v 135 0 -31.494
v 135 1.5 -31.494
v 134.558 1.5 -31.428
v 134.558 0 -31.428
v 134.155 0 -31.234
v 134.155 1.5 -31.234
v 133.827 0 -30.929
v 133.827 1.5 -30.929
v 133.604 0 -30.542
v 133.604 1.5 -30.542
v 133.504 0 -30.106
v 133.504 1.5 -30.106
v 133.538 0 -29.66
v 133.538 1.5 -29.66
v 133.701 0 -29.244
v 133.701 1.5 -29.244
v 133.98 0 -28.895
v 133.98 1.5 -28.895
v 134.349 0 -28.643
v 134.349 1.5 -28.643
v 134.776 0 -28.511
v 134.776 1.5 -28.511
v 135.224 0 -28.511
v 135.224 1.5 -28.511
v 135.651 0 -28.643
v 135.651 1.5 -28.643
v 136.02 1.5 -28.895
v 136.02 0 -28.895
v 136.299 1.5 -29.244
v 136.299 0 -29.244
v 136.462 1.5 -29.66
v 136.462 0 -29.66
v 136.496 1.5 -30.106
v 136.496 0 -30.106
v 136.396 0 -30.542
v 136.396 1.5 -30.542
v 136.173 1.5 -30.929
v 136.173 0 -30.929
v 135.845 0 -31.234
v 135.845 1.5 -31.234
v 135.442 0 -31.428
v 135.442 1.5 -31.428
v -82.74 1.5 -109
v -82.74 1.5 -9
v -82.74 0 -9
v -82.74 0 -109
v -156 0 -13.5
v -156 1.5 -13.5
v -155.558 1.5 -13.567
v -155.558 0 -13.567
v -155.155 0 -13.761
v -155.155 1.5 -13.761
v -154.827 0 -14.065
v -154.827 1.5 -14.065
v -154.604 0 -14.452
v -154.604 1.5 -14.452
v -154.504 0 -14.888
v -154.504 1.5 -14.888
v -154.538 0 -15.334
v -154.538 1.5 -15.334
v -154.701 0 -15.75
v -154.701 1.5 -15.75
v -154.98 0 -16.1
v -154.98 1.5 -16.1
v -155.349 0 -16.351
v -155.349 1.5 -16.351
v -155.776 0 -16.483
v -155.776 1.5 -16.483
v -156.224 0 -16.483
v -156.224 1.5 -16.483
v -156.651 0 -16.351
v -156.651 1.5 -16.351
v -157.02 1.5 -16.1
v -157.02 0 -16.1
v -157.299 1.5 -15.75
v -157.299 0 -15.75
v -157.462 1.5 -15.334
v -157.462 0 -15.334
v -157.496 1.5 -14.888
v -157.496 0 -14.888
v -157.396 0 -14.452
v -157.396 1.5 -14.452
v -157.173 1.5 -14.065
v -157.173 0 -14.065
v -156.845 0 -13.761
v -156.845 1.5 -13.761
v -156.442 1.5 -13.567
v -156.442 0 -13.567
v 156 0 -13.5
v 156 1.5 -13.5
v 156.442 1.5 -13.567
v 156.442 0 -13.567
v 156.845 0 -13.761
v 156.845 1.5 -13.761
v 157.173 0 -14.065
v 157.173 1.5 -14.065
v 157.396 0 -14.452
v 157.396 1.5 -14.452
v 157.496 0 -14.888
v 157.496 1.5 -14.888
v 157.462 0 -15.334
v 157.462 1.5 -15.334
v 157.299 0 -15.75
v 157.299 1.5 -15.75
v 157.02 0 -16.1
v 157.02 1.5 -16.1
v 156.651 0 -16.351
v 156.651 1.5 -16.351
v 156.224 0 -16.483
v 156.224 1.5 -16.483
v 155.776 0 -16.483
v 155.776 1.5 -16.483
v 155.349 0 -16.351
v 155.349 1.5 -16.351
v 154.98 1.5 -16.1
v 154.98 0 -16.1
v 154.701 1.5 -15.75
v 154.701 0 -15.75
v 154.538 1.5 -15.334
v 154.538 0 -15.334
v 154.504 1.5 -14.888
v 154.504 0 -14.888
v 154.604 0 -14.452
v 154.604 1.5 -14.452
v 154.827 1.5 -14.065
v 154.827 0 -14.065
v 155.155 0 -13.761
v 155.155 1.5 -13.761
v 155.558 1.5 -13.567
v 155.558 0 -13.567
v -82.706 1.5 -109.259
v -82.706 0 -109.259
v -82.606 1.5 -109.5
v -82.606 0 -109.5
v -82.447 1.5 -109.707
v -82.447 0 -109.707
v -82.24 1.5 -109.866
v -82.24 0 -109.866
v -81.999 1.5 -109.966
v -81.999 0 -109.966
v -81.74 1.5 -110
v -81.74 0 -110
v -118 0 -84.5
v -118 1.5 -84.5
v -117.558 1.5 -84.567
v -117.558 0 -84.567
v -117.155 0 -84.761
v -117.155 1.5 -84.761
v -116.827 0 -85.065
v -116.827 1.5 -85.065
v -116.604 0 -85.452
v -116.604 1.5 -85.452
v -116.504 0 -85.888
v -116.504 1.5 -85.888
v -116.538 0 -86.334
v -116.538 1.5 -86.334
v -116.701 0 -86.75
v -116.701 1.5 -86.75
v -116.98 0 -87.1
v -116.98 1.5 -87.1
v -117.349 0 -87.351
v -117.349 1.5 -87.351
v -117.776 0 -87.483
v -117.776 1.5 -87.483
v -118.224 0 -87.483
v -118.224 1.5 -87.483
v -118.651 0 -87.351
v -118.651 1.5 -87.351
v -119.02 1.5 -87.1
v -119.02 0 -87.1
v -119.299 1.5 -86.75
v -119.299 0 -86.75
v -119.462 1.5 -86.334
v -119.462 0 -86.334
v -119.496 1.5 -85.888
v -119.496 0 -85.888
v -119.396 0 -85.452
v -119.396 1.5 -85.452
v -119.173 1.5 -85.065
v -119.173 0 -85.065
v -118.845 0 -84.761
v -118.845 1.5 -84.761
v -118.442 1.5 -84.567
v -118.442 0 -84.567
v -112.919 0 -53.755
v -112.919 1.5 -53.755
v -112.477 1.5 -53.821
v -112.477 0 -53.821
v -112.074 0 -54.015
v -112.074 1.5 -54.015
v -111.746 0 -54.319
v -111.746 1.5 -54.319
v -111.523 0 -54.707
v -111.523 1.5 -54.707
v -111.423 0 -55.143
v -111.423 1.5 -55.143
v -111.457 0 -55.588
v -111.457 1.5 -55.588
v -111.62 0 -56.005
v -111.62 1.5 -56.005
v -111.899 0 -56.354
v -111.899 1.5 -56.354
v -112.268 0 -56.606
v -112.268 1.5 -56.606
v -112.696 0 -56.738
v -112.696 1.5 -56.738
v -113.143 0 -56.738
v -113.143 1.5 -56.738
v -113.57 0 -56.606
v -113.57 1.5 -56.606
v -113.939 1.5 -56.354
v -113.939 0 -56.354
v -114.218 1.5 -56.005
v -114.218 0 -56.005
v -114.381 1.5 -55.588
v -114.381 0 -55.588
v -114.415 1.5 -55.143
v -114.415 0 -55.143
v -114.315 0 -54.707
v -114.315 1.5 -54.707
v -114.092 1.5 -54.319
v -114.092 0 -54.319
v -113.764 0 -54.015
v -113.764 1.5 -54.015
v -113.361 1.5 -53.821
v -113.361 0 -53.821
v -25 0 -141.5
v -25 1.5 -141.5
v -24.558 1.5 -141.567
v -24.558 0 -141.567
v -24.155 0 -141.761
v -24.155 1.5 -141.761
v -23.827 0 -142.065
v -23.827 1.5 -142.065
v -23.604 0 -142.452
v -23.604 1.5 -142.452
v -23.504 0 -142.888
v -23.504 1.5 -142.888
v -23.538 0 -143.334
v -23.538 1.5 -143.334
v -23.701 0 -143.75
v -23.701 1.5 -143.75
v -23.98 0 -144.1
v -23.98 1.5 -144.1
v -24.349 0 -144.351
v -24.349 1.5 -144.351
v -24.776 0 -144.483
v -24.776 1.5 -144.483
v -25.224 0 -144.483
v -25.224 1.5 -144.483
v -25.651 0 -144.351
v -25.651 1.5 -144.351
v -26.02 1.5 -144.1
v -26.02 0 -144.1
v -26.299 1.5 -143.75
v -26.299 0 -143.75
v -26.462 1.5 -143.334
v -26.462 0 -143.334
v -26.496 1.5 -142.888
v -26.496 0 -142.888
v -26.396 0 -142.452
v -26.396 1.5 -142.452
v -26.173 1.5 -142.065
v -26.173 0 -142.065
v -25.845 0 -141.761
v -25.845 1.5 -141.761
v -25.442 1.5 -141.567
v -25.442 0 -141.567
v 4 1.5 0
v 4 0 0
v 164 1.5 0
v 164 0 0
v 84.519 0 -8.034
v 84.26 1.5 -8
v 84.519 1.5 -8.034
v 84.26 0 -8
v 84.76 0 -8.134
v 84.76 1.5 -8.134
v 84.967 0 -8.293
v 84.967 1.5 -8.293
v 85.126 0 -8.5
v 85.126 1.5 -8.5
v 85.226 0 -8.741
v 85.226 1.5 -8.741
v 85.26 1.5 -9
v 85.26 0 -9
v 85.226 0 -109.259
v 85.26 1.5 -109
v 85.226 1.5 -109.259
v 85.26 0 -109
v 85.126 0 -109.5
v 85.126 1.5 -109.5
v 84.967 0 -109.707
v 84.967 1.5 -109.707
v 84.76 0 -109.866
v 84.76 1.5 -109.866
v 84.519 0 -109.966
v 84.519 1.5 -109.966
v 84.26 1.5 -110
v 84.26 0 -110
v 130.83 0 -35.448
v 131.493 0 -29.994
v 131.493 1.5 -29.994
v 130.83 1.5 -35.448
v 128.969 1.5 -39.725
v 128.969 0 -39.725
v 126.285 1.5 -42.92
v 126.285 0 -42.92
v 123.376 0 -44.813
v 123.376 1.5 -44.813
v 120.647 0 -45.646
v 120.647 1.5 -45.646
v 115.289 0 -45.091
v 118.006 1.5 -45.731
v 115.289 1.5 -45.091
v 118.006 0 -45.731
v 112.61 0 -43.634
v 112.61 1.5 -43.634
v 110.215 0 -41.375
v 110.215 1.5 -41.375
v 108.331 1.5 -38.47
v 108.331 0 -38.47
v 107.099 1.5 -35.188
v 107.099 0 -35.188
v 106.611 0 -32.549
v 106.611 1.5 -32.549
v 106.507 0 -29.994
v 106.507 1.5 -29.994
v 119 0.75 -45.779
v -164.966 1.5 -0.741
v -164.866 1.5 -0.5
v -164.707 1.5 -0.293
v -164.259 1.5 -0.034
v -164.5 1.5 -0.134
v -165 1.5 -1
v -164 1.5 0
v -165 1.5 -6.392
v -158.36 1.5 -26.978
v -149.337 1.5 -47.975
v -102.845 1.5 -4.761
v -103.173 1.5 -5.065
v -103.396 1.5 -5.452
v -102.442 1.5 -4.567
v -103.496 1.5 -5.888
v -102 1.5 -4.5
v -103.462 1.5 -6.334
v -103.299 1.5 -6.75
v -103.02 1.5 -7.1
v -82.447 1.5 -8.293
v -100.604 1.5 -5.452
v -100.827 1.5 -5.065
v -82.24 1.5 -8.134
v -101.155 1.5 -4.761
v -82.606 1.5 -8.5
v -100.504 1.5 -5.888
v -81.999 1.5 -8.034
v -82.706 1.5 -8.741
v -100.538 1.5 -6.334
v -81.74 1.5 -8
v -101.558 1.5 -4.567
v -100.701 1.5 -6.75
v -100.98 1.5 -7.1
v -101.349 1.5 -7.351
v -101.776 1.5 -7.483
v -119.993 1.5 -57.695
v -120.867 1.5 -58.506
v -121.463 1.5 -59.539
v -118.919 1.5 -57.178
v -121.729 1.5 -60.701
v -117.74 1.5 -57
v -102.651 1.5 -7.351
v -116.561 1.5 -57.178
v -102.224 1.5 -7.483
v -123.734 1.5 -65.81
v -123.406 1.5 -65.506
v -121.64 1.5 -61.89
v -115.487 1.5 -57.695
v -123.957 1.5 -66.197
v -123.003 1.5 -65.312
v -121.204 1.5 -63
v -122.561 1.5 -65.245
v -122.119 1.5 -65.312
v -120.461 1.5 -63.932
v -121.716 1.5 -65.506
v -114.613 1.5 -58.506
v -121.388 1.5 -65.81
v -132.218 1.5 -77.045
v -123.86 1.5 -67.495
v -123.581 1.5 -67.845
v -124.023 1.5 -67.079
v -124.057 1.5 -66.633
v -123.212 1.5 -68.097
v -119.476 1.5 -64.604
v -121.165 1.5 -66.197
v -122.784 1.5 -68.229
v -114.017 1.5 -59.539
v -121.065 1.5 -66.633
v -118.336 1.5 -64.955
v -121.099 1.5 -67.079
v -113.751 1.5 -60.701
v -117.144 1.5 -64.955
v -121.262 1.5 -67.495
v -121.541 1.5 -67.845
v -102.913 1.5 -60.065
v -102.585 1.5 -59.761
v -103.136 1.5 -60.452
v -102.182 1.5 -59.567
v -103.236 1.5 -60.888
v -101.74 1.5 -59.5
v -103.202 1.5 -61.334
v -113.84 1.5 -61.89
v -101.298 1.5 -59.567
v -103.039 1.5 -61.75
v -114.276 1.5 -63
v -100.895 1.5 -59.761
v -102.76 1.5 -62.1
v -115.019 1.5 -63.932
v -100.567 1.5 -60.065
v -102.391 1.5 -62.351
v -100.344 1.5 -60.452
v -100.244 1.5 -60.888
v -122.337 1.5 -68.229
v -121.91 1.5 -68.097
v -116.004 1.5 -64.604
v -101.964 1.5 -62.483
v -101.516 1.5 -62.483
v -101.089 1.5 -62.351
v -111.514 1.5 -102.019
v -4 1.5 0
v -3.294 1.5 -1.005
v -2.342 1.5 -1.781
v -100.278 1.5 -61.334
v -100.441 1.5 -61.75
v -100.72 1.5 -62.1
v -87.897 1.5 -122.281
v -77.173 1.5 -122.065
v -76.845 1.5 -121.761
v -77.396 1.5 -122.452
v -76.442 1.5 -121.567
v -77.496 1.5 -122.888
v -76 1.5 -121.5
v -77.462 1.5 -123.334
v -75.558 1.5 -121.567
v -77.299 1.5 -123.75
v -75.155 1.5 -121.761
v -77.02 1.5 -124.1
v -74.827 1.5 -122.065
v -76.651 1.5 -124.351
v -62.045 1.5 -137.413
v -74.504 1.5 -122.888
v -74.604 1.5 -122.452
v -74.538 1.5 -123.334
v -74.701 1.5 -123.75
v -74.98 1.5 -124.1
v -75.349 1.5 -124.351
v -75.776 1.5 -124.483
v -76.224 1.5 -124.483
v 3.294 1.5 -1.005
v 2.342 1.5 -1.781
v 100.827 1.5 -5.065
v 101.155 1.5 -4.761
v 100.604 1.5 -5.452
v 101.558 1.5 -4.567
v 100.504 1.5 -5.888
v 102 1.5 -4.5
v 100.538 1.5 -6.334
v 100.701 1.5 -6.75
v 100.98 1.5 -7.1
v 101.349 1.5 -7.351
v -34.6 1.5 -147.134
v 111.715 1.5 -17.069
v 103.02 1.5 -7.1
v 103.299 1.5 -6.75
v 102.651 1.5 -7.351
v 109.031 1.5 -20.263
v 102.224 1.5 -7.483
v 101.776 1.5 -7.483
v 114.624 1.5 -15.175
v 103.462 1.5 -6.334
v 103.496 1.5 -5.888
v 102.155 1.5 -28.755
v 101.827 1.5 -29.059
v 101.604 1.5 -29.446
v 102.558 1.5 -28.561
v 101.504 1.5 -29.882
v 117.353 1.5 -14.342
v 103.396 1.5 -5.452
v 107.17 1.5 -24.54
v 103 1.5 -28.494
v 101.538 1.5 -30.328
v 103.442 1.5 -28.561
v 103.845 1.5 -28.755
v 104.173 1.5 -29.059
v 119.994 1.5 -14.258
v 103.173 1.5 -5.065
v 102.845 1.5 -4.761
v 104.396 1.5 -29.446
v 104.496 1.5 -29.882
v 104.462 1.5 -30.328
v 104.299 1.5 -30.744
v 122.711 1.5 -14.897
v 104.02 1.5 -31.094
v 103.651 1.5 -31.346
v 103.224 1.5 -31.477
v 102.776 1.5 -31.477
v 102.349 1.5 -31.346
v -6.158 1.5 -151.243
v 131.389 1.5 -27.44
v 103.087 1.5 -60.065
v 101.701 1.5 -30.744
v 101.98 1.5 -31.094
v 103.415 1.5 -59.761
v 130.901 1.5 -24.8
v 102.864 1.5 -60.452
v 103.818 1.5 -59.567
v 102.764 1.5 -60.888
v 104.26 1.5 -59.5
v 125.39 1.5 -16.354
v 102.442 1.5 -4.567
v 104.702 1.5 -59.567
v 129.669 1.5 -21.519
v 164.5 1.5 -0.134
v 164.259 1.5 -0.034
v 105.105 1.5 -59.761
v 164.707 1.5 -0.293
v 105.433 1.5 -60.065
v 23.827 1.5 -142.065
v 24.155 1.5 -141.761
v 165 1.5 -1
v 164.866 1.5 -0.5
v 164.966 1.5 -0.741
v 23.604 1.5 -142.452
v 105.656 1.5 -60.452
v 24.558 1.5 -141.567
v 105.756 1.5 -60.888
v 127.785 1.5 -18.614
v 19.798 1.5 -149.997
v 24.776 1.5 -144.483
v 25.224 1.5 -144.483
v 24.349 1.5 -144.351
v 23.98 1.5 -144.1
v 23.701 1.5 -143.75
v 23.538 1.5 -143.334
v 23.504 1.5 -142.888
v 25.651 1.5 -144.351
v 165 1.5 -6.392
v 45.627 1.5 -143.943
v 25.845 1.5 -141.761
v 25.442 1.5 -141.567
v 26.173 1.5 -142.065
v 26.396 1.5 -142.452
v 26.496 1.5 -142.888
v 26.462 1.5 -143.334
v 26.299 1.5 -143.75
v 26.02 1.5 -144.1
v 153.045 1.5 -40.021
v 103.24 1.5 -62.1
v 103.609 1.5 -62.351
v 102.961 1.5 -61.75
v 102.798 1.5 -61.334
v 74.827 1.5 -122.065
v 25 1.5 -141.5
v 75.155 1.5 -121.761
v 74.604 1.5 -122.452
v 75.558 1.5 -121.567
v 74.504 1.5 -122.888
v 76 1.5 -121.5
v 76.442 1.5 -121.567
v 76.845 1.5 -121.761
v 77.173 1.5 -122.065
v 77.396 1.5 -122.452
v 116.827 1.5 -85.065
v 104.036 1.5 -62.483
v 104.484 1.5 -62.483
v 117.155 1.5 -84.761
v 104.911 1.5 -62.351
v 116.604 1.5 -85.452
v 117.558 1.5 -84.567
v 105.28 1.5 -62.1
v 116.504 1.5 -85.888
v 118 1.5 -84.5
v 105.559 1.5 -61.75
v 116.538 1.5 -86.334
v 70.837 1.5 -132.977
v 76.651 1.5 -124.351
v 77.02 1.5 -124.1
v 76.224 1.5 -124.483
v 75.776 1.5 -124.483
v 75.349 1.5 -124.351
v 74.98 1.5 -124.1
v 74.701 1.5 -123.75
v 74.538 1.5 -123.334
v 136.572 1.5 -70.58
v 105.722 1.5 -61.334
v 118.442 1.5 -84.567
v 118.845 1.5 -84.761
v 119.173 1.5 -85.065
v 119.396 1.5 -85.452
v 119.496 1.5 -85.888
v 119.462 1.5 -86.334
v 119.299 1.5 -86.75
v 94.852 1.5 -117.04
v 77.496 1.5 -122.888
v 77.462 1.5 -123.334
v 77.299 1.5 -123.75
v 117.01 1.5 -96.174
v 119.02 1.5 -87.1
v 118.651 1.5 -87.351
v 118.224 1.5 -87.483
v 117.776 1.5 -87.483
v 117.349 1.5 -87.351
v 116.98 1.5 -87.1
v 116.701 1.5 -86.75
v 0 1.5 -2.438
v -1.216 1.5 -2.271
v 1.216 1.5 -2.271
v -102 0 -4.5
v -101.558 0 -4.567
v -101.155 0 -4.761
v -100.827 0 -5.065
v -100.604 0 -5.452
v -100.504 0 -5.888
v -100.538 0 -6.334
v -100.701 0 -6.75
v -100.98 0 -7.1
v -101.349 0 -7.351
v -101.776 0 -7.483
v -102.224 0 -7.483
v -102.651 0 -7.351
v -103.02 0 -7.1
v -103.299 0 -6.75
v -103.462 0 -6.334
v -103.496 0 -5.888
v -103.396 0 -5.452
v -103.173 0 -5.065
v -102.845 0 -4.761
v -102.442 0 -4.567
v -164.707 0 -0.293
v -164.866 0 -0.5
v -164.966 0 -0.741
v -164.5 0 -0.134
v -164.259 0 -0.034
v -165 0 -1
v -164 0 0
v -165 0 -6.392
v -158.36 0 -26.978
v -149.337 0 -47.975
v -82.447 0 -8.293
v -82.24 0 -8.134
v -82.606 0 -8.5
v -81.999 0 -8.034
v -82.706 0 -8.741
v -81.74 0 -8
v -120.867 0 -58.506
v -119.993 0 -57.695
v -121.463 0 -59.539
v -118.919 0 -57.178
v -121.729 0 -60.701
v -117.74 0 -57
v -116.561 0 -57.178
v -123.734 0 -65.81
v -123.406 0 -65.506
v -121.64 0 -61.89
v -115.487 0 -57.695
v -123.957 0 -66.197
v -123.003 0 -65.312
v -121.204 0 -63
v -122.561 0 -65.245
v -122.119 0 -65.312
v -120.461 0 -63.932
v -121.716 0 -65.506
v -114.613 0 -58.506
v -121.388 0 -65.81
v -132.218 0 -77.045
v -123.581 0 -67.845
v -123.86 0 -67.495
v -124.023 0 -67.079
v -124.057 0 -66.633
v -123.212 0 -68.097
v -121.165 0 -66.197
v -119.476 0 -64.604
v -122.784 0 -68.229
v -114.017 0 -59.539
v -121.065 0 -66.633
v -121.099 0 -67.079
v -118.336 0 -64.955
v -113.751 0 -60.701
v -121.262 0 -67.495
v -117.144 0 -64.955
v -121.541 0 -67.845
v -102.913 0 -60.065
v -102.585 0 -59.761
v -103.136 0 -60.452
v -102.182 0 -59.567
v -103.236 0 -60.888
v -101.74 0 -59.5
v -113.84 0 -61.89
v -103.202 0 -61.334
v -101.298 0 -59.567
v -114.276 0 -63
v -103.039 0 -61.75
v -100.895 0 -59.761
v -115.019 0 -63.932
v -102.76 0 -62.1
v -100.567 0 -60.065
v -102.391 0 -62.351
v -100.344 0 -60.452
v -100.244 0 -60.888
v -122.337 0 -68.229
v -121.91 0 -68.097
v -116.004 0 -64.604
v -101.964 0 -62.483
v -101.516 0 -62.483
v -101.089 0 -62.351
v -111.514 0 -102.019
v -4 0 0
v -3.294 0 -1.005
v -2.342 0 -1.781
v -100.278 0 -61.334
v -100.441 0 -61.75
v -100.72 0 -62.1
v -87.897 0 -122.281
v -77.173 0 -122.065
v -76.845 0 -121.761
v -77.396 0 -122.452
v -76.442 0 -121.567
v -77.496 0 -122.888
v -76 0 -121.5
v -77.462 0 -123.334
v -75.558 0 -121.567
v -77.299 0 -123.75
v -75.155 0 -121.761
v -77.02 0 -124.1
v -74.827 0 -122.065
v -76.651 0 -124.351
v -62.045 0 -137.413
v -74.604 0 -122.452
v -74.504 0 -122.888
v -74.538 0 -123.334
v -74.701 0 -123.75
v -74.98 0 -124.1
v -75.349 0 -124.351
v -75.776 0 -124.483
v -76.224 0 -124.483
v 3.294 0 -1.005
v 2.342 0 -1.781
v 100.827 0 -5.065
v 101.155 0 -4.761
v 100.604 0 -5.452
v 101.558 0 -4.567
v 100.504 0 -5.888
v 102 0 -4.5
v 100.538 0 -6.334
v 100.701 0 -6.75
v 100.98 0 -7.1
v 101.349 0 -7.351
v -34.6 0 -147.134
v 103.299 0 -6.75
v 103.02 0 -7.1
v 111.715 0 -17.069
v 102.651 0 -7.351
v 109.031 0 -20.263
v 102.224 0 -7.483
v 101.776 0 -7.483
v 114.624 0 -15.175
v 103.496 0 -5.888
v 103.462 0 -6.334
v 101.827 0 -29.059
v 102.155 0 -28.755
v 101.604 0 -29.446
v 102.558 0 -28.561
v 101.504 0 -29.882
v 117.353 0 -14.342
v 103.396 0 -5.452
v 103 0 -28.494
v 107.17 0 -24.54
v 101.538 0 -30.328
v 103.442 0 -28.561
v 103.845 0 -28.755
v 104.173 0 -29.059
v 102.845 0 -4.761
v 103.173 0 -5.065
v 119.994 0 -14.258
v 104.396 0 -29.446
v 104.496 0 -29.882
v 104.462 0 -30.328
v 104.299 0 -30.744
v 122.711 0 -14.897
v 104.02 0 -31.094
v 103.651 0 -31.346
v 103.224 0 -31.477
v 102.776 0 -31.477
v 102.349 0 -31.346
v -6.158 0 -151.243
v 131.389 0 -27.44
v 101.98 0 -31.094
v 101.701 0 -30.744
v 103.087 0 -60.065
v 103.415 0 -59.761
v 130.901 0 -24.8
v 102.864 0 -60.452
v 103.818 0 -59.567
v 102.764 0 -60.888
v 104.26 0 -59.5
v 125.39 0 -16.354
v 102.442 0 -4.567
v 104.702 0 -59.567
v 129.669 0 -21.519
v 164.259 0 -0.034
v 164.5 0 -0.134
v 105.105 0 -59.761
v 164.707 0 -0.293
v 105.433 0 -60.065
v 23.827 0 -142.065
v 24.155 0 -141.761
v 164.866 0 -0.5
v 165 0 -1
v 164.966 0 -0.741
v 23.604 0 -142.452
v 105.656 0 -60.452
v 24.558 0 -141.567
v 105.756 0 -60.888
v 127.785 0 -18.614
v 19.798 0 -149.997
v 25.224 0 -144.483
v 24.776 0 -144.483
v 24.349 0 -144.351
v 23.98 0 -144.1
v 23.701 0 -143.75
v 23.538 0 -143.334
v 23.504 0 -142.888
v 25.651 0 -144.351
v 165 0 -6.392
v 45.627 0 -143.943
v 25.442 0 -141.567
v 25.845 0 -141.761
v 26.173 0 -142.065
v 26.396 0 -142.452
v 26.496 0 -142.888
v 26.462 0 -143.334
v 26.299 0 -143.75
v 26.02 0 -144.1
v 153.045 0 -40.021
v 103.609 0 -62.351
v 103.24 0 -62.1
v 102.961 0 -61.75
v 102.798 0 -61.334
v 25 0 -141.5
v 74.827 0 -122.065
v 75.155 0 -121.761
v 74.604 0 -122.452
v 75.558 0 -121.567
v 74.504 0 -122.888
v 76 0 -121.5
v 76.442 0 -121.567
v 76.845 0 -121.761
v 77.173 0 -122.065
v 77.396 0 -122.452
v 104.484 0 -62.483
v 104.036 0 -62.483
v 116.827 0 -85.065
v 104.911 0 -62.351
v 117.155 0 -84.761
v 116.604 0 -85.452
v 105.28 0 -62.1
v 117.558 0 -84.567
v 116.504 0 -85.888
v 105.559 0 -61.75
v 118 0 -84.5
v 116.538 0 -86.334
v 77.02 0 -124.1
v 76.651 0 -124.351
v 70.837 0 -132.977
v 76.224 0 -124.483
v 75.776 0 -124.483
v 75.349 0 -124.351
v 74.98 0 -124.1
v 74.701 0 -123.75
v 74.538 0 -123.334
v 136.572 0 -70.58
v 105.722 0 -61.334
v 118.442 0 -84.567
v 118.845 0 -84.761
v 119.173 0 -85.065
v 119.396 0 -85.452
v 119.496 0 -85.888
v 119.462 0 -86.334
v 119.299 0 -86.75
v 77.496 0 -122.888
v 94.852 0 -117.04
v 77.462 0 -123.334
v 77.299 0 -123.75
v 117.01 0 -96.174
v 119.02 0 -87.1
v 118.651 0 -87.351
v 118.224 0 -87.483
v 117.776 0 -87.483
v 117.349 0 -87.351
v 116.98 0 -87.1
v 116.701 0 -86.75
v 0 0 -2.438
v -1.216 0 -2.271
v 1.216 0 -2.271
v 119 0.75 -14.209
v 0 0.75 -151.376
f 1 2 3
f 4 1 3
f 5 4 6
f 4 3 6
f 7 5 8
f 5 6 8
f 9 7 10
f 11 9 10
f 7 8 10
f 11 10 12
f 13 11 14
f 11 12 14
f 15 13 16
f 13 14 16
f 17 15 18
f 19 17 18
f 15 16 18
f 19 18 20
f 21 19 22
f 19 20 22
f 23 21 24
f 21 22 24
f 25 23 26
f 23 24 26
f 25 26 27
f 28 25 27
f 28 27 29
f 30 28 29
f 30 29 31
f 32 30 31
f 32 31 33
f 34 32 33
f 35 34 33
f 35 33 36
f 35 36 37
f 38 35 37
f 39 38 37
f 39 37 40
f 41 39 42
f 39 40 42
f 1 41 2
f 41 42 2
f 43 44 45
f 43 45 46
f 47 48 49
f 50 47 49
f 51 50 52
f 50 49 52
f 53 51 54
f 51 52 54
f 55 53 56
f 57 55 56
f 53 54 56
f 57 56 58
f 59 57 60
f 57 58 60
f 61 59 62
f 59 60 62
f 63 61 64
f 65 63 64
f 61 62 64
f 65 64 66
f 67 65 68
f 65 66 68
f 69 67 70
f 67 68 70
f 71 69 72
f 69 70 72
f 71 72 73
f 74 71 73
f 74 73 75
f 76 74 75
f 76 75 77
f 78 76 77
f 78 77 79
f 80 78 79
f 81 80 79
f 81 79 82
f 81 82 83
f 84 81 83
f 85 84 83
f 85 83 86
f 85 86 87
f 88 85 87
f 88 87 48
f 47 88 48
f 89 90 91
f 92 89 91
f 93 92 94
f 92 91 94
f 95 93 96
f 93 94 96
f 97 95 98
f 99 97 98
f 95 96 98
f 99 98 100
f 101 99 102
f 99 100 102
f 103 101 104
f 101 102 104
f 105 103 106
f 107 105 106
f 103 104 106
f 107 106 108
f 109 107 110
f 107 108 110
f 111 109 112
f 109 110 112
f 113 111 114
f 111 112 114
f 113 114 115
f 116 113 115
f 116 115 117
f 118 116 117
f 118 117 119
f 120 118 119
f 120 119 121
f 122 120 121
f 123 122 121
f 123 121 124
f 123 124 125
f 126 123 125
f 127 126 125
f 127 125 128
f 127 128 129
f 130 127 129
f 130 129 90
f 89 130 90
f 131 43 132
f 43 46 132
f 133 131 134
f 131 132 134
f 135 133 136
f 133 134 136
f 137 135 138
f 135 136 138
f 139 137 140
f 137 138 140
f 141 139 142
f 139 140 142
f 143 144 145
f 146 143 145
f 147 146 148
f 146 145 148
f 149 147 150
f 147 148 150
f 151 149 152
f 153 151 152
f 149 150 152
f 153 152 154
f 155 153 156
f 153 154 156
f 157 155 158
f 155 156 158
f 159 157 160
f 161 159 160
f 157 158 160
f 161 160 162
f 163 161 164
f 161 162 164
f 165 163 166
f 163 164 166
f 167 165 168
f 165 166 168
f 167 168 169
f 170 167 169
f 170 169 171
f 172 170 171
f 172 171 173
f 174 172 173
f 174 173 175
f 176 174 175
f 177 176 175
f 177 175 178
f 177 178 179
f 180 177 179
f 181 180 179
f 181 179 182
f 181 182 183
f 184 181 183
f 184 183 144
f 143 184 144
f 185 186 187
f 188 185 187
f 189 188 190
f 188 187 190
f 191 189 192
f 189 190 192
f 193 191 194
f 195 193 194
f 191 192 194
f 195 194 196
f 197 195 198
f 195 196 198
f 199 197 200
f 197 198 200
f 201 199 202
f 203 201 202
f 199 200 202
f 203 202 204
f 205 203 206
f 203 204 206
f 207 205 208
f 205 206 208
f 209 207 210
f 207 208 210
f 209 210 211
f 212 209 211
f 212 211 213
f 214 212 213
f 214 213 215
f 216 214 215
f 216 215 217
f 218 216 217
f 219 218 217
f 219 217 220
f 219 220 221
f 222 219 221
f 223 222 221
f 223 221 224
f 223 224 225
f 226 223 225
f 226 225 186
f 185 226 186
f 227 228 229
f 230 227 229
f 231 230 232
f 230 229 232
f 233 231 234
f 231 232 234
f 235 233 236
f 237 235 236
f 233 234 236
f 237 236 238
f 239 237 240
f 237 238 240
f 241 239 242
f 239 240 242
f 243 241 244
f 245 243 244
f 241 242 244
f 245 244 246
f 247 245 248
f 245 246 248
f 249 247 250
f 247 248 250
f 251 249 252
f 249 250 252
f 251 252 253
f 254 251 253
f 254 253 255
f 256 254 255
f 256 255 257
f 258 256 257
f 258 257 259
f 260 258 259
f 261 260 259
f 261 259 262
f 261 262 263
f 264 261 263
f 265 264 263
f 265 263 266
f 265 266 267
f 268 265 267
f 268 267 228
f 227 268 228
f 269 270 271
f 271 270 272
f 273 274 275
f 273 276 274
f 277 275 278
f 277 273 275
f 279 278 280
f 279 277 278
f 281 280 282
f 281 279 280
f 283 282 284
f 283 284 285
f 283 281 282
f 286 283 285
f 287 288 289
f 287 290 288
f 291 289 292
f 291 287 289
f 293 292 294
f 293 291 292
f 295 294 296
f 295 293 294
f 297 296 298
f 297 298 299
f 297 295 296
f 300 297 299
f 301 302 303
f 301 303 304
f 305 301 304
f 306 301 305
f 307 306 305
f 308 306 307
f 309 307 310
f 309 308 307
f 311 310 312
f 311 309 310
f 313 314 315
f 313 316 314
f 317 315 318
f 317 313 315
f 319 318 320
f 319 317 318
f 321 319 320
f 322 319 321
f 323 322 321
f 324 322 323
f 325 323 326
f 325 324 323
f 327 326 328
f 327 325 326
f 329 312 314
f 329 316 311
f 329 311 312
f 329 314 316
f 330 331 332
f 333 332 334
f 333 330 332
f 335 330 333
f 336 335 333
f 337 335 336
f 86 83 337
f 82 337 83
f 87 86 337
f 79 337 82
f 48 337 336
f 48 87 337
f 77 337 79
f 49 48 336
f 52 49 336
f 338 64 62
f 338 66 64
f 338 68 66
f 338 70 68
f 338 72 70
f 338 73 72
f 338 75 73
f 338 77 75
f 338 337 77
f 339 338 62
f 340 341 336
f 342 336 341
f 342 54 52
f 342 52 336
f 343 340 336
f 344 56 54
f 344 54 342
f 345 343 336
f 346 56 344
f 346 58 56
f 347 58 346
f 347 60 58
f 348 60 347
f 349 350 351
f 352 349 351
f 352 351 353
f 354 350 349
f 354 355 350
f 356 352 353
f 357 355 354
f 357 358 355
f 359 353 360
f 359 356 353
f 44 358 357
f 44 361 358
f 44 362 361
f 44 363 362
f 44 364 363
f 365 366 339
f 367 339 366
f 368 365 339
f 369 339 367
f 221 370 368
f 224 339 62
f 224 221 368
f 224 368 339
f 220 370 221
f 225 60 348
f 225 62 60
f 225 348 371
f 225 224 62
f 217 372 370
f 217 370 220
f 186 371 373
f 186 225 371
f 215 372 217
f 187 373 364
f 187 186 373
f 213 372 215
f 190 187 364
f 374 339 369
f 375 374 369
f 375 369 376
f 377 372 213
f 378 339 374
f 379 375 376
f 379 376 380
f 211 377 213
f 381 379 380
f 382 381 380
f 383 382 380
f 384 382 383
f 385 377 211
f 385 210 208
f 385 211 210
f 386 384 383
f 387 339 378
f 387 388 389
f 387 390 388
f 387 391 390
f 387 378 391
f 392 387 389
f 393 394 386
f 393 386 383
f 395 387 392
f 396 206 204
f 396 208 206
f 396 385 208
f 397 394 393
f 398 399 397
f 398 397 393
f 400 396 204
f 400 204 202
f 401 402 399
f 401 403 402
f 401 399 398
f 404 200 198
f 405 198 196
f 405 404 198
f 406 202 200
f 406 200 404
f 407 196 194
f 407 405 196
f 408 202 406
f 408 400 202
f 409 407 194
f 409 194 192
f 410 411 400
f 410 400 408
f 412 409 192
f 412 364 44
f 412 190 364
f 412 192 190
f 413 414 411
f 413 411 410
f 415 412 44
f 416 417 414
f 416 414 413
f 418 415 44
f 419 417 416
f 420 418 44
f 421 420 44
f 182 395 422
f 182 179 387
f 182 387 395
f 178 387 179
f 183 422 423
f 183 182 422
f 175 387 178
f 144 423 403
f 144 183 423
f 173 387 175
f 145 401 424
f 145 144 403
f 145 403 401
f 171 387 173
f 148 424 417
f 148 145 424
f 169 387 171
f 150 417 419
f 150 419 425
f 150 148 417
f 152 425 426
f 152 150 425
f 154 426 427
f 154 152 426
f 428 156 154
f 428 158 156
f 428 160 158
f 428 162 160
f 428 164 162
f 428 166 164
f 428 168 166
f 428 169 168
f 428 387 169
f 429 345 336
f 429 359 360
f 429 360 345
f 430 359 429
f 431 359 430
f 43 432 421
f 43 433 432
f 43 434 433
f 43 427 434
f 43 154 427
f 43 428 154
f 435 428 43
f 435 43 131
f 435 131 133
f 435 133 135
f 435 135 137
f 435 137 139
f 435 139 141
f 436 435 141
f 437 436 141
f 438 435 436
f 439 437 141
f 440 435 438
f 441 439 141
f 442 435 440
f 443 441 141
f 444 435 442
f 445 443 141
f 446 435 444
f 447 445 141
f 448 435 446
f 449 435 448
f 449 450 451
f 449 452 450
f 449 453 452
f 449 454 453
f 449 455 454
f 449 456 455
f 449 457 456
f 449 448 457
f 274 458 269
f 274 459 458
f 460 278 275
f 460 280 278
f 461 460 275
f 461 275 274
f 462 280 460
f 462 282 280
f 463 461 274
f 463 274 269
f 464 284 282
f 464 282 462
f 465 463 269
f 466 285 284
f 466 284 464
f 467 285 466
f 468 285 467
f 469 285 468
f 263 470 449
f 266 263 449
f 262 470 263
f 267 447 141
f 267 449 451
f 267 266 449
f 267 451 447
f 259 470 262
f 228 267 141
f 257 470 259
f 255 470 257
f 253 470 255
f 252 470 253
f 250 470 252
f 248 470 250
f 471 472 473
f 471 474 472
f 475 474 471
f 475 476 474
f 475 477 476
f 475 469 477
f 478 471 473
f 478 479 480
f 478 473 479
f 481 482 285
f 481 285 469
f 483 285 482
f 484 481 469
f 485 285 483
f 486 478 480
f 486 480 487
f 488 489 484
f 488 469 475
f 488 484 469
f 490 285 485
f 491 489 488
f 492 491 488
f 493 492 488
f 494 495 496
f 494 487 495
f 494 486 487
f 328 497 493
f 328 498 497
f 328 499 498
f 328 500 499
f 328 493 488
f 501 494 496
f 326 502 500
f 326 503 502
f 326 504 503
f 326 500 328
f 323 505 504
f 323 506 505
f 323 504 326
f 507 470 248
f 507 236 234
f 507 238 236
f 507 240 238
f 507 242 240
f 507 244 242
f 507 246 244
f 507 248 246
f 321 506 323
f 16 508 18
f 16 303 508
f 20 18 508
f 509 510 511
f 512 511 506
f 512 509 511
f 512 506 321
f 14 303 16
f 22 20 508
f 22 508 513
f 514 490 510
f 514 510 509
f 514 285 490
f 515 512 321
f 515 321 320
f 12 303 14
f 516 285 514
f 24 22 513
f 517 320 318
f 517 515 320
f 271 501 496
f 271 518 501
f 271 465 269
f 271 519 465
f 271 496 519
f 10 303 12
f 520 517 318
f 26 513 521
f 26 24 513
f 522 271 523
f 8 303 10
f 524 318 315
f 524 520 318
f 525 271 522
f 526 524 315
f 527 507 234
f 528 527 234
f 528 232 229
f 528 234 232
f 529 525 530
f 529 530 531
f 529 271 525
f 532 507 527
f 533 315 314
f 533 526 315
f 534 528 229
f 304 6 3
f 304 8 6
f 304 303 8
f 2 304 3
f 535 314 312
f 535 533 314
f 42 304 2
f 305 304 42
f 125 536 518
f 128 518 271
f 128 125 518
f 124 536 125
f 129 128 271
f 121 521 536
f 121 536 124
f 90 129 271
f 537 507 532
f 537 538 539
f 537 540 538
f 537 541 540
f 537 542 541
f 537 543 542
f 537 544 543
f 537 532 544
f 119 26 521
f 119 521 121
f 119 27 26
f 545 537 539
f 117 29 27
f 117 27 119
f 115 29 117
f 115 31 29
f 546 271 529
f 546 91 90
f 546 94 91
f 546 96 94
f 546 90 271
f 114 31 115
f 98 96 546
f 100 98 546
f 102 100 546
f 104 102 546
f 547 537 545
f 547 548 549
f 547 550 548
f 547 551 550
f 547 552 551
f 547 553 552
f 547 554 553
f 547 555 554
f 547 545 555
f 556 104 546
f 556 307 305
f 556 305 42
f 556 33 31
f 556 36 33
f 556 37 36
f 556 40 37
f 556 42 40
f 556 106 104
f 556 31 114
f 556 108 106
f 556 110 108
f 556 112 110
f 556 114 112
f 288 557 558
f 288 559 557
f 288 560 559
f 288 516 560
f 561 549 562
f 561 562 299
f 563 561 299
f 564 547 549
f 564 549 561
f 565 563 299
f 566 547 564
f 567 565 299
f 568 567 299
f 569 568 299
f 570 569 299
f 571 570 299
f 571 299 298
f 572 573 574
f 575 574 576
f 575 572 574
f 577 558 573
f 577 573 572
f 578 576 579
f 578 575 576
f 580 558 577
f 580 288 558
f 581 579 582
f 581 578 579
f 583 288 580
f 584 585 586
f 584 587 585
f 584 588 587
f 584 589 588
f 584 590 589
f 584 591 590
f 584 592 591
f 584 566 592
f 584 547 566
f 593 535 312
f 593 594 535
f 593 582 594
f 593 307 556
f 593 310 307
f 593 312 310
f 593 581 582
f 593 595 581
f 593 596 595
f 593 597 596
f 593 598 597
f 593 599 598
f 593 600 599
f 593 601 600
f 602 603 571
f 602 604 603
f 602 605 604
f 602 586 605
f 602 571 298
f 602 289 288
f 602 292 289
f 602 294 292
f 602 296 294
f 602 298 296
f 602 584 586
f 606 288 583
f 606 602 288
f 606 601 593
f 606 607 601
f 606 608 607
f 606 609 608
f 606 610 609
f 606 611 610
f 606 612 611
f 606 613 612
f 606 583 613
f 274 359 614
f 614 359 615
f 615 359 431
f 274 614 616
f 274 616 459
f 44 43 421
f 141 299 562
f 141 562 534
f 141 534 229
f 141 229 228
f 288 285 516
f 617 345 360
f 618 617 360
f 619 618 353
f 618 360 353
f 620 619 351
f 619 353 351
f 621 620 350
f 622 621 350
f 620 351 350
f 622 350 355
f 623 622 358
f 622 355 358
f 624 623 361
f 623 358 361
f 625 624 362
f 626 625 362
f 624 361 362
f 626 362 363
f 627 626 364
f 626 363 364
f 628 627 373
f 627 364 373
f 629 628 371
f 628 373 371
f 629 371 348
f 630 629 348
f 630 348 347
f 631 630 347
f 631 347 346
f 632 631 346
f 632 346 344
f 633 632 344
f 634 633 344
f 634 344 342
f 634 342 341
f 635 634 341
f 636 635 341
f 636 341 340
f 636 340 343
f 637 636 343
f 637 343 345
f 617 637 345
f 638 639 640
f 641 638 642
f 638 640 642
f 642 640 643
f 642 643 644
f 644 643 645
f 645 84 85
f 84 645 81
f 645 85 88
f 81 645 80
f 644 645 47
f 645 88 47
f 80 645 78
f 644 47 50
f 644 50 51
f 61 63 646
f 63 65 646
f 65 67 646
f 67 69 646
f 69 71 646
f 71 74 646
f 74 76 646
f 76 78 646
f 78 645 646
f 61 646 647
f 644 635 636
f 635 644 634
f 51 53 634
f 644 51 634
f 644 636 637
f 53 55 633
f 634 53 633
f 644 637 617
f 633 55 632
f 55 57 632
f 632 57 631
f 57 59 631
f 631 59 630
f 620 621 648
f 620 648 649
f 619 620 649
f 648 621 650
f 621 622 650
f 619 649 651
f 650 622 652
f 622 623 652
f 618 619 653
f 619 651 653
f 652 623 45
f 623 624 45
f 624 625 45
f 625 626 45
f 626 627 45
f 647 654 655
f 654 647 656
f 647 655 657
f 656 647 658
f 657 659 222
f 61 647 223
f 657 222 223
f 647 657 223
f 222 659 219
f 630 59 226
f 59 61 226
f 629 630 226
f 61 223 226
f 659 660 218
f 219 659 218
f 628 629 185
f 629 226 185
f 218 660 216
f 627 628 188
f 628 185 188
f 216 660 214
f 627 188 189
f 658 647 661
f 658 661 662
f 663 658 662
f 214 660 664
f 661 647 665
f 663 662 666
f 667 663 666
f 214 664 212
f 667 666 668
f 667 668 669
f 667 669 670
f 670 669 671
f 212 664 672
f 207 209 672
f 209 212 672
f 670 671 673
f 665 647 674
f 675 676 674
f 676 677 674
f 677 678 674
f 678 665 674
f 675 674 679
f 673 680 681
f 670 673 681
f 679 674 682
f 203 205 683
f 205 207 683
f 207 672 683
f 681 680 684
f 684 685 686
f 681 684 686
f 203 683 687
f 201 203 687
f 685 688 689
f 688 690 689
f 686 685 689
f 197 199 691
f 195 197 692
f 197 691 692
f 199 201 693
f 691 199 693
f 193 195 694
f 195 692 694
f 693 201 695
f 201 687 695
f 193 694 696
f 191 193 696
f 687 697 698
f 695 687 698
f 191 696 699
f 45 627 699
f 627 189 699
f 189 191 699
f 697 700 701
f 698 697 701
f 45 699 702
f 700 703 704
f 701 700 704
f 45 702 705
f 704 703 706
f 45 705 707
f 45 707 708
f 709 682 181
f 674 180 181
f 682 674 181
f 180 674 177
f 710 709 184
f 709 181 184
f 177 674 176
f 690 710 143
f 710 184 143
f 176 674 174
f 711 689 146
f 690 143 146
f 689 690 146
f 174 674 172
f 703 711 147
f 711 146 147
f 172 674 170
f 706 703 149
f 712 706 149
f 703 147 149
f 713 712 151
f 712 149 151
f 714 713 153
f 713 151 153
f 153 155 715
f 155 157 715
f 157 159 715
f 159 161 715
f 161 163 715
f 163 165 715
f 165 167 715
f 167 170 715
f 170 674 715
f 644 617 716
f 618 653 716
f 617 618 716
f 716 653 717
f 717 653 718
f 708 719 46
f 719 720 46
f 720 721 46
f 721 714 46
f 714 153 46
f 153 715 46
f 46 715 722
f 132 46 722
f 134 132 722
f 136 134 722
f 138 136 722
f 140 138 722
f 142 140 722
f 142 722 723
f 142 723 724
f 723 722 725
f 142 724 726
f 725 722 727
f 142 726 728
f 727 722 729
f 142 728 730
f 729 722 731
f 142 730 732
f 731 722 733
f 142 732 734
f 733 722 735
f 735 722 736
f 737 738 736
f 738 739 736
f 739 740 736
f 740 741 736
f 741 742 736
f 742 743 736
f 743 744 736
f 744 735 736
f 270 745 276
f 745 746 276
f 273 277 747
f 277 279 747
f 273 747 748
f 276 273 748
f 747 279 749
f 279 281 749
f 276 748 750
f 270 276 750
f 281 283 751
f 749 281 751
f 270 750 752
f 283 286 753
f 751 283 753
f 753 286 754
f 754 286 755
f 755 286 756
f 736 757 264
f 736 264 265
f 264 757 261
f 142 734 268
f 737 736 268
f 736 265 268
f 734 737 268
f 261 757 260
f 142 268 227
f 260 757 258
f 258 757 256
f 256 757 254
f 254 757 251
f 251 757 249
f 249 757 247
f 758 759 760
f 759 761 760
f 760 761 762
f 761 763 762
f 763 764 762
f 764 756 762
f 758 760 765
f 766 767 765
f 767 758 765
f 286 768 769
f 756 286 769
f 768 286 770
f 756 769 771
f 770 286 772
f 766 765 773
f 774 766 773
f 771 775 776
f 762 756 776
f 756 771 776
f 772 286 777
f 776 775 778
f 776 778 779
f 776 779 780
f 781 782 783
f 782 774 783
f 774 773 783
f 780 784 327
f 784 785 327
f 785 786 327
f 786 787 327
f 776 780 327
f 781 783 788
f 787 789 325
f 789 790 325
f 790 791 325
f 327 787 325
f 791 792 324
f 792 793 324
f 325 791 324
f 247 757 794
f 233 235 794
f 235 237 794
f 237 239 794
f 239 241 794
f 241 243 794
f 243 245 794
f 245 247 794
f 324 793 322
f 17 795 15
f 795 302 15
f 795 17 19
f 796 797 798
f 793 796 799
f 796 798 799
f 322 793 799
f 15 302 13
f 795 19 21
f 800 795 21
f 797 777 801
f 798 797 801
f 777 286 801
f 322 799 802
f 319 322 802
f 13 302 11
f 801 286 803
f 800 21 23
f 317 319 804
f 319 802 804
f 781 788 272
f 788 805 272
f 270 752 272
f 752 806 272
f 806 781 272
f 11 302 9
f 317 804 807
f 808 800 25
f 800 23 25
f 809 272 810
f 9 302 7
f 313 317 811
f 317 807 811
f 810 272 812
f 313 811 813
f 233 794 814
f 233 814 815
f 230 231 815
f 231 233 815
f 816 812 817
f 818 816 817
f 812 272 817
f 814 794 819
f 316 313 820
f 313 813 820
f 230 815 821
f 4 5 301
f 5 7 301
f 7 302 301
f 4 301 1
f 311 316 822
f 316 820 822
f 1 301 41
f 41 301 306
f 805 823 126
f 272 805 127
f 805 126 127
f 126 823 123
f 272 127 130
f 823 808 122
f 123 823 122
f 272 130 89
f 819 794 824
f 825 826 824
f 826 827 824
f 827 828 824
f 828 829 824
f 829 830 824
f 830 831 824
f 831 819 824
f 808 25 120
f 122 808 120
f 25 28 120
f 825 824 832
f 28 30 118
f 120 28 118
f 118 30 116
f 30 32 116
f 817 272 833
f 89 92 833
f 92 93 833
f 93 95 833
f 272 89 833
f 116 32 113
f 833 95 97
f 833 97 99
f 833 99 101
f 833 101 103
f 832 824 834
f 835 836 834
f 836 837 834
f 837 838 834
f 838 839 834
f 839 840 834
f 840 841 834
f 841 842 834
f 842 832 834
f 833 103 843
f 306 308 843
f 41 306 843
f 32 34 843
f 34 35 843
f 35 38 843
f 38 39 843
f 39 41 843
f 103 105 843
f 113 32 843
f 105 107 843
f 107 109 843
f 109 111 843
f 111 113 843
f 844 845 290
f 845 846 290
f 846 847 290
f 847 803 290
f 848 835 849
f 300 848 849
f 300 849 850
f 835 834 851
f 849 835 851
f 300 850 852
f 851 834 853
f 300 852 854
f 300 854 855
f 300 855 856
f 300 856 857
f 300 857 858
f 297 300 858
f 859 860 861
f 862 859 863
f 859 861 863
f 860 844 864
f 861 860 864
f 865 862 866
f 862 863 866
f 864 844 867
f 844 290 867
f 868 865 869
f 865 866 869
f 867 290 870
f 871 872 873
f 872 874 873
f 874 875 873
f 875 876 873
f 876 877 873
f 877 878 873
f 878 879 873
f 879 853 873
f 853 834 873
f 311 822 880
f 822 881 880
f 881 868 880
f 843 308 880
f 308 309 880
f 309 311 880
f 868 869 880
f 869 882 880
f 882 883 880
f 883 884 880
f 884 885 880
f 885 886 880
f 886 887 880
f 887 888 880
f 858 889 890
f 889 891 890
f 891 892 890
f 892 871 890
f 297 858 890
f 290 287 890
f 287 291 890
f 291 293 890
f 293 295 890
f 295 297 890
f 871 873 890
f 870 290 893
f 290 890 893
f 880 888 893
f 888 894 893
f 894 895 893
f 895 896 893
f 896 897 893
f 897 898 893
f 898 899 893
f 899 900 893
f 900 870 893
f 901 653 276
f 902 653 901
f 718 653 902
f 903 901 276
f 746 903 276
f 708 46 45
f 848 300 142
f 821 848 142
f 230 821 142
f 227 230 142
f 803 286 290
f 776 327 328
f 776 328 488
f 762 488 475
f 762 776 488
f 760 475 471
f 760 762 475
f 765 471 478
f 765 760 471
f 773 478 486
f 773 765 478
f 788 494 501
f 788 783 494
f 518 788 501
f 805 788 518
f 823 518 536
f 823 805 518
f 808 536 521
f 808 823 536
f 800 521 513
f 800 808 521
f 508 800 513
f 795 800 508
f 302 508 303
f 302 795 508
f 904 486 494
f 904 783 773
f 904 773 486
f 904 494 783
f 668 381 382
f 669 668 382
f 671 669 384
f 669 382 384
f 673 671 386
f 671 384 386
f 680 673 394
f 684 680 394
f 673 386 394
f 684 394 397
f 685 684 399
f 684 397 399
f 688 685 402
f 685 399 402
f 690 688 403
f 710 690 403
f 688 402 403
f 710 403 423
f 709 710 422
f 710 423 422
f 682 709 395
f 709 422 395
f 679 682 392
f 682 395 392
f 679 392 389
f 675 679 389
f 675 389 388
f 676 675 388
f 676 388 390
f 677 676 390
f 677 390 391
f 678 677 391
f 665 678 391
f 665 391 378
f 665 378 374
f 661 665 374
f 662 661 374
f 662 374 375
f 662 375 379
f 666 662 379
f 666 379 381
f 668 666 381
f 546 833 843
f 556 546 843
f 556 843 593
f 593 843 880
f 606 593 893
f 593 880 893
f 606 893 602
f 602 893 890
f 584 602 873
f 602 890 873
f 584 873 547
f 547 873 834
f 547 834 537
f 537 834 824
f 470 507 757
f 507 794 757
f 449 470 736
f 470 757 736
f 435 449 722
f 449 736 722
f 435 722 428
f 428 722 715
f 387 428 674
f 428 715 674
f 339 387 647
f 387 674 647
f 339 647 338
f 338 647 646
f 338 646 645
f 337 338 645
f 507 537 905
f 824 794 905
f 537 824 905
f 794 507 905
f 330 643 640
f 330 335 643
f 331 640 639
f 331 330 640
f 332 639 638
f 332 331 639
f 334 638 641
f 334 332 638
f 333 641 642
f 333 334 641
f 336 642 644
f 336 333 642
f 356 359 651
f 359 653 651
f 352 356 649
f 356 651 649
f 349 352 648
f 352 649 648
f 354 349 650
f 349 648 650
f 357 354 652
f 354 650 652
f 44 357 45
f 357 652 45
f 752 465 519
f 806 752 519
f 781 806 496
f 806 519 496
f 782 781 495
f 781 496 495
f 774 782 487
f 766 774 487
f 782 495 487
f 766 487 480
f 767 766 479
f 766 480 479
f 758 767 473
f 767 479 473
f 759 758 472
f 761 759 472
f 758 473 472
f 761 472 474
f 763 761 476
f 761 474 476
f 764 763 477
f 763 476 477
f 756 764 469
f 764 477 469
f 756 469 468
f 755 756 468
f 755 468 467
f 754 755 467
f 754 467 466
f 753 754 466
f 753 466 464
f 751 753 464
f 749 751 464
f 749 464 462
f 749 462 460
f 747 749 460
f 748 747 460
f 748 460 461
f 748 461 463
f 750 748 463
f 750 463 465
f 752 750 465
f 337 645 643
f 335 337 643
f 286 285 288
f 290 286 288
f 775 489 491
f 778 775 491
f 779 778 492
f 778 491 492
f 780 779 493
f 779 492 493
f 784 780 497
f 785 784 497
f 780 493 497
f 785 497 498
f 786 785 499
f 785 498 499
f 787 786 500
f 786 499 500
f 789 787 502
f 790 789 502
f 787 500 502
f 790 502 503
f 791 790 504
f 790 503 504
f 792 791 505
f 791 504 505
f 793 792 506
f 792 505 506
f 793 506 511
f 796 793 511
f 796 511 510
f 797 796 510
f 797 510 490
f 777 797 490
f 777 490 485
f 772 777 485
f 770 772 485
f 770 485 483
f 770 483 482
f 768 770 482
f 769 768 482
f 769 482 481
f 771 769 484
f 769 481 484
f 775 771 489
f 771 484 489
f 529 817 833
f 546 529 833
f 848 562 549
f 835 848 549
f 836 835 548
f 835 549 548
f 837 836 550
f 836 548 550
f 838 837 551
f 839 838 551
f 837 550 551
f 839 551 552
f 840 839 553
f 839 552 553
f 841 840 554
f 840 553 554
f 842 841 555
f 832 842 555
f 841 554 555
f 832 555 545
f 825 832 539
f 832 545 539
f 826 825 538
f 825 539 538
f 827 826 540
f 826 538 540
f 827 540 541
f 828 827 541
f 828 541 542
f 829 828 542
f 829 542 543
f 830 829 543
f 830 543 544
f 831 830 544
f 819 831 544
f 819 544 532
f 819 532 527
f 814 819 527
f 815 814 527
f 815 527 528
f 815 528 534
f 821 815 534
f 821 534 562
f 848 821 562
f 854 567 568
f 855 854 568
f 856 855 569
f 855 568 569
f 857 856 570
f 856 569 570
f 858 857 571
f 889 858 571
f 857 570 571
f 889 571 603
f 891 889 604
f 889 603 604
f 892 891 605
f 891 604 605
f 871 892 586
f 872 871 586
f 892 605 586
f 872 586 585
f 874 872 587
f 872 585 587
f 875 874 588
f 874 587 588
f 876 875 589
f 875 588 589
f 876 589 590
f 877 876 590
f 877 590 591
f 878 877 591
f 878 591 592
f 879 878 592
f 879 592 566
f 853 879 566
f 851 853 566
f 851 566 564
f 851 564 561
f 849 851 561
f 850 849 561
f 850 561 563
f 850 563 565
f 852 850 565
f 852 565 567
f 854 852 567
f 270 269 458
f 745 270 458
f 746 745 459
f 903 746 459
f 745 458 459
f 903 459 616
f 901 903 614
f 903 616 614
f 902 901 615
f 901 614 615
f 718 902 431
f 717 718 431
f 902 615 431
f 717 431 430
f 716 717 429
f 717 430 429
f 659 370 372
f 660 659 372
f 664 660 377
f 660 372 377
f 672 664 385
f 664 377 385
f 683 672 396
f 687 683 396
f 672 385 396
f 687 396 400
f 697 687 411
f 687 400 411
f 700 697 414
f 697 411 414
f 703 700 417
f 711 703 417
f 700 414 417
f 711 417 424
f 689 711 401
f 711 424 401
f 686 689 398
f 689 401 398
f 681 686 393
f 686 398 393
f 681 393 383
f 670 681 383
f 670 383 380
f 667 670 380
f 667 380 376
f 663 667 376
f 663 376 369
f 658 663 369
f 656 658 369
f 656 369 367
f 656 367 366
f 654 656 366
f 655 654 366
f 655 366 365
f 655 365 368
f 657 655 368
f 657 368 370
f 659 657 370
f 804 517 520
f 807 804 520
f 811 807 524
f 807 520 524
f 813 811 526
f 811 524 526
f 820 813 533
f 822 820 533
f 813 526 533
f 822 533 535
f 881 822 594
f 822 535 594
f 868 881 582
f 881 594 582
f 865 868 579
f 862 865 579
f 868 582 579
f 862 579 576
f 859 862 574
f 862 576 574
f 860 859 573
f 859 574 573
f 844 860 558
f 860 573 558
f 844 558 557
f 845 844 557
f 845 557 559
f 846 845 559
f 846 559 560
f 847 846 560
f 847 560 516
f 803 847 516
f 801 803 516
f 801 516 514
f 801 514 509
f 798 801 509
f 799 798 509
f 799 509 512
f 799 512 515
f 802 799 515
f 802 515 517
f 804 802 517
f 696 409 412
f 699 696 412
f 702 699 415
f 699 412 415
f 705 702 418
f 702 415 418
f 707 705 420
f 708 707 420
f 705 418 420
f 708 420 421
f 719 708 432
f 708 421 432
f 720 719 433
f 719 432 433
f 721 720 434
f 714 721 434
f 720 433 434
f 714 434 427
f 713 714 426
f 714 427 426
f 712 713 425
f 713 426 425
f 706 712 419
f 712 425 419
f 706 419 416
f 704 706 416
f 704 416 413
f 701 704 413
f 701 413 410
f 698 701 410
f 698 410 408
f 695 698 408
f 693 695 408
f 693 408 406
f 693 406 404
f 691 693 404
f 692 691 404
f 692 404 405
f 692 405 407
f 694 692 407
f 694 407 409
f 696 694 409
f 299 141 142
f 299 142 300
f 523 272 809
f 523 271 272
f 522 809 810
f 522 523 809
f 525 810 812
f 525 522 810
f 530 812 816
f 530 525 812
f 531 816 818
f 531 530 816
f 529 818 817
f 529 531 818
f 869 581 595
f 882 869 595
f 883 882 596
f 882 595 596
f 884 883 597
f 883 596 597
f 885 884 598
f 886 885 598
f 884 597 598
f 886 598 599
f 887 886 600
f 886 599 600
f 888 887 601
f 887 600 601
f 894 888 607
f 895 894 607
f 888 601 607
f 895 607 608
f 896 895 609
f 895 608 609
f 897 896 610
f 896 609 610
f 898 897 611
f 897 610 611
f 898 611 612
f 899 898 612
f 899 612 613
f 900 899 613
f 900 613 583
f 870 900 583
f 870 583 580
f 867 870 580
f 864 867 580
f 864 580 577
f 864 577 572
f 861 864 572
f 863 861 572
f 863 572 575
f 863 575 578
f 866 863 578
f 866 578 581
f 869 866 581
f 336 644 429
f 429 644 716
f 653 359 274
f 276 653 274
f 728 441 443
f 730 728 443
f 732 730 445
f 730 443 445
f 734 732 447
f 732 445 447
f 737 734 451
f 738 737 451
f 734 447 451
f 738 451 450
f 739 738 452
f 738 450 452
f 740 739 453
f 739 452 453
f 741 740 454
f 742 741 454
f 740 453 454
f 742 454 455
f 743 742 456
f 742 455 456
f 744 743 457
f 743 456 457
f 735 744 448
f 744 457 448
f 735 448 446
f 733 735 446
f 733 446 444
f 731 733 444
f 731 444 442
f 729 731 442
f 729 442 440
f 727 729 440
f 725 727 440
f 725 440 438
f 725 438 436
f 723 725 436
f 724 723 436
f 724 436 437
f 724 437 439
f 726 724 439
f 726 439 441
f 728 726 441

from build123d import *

# Parameters (mm, degrees)
BOSS_EXTRU_1_DEPTH      = 1.5
ESQUISSE4_R             = 4
ESQUISSE4_R_2           = 1.5
ESQUISSE4_W             = 168
ESQUISSE4_H             = 102
ENL_V_MAT_EXTRU_3_DEPTH = 3
ENL_V_MAT_EXTRU_4_DEPTH = 1.5
ESQUISSE11_R            = 1.5
ENL_V_MAT_EXTRU_5_DEPTH = 1.5
CONG_1_R                = 1
ESQUISSE12_R            = 1.5
ENL_V_MAT_EXTRU_6_DEPTH = 224.924001117


# Read off the part's stored shape, not the designer's step: Enlèv. mat.-Extru.4
with BuildPart() as part:
    # Esquisse1 → Boss.-Extru.1 (new body)
    with BuildSketch(Plane(origin=(0, 0, 0), x_dir=(1, 0, 0), z_dir=(0, 1, 0))):
        with BuildLine():
            Line((-165, 6.391802297), (-165, 0))
            Line((-165, 0), (165, 0))
            Line((165, 0), (165, 6.391802297))
            add(Edge.make_bspline(
                [(165, 6.391802297), (0, 608.094924715), (-165, 6.391802297)],
                knots=[1.893832827, 1.893832827, 1.893832827, 4.38935248, 4.38935248, 4.38935248], degree=2, weights=[1, 0.317447459, 1]))
        make_face()
    extrude(amount=BOSS_EXTRU_1_DEPTH)

    # Esquisse4 → Enlèv. mat.-Extru.3 (cut)
    with BuildSketch(Plane(origin=(0, 1.5, 0), x_dir=(1, 0, 0), z_dir=(0, 1, 0))):
        with Locations(Location((-117.74, 61, 0), (0, 0, 270))):
            Circle(ESQUISSE4_R)
        with Locations(Location((-112.919092927, 55.254666677, 0), (0, 0, 270))):
            Circle(ESQUISSE4_R_2)
        with Locations(Location((-122.560907073, 66.745333323, 0), (0, 0, 270))):
            Circle(ESQUISSE4_R_2)
        with Locations(Location((-101.74, 61, 0), (0, 0, 270))):
            Circle(ESQUISSE4_R_2)
        with Locations(Location((104.26, 61, 0), (0, 0, 270))):
            Circle(ESQUISSE4_R_2)
        with Locations((1.26, 59)):
            Rectangle(ESQUISSE4_W, ESQUISSE4_H)
    extrude(amount=-ENL_V_MAT_EXTRU_3_DEPTH, mode=Mode.SUBTRACT)

    # Enlèv. mat.-Extru.4 outline → Enlèv. mat.-Extru.4 (cut)
    with BuildSketch(Plane(origin=(0, 0, 0), x_dir=(1, 0, 0), z_dir=(0, 1, 0))):
        with BuildLine():
            add(Edge.make_bspline(
                [(131.492595534, 29.994209065), (131.937846155, 45.779047079), (119, 45.779047079), (106.062153845, 45.779047079), (106.507404466, 29.994209065)],
                knots=[1.536374944, 1.536374944, 1.536374944, 3.141592654, 3.141592654, 4.746810363, 4.746810363, 4.746810363], degree=2, weights=[1, 0.694832863, 1, 0.694832863, 1]))
            add(Edge.make_bspline(
                [(106.507404466, 29.994209065), (106.062153845, 14.209371052), (119, 14.209371052), (131.937846155, 14.209371052), (131.492595534, 29.994209065)],
                knots=[4.677967597, 4.677967597, 4.677967597, 6.283185307, 6.283185307, 7.888403017, 7.888403017, 7.888403017], degree=2, weights=[1, 0.694832863, 1, 0.694832863, 1]))
        make_face()
    extrude(amount=ENL_V_MAT_EXTRU_4_DEPTH, mode=Mode.SUBTRACT)

    # Esquisse11 → Enlèv. mat.-Extru.5 (cut)
    with BuildSketch(Plane(origin=(0, 1.5, 0), x_dir=(1, 0, 0), z_dir=(0, 1, 0))):
        with Locations(Location((103, 29.994209065, 0), (0, 0, 270))):
            Circle(ESQUISSE11_R)
        with Locations(Location((135, 29.994209065, 0), (0, 0, 90))):
            Circle(ESQUISSE11_R)
    extrude(amount=-ENL_V_MAT_EXTRU_5_DEPTH, mode=Mode.SUBTRACT)

    # Congé1
    cong_1_edges = [part.edges().sort_by_distance(p)[0] for p in [
        (-82.74, 0.75, -110),
        (-82.74, 0.75, -8),
        (85.26, 0.75, -8),
        (85.26, 0.75, -110),
        (165, 0.75, 0),
        (-165, 0.75, 0),
    ]]
    fillet(cong_1_edges, radius=CONG_1_R)

    # Esquisse12 → Enlèv. mat.-Extru.6 (cut, through all)
    with BuildSketch(Plane(origin=(0, 1.5, 0), x_dir=(1, 0, 0), z_dir=(0, 1, 0))):
        with Locations(Location((-156, 15, 0), (0, 0, 270))):
            Circle(ESQUISSE12_R)
        with Locations(Location((-76, 123, 0), (0, 0, 270))):
            Circle(ESQUISSE12_R)
        with Locations(Location((-25, 143, 0), (0, 0, 270))):
            Circle(ESQUISSE12_R)
        with Locations(Location((25, 143, 0), (0, 0, 270))):
            Circle(ESQUISSE12_R)
        with Locations(Location((76, 123, 0), (0, 0, 270))):
            Circle(ESQUISSE12_R)
        with Locations(Location((156, 15, 0), (0, 0, 270))):
            Circle(ESQUISSE12_R)
        with Locations(Location((-102, 6, 0), (0, 0, 270))):
            Circle(ESQUISSE12_R)
        with Locations(Location((102, 6, 0), (0, 0, 270))):
            Circle(ESQUISSE12_R)
        with Locations(Location((-118, 86, 0), (0, 0, 270))):
            Circle(ESQUISSE12_R)
        with Locations(Location((118, 86, 0), (0, 0, 270))):
            Circle(ESQUISSE12_R)
        with BuildLine():
            Line((-4, 0), (4, 0))
            ThreePointArc((4, 0), (0, 2.438447187), (-4, 0))
        make_face()
    extrude(amount=-ENL_V_MAT_EXTRU_6_DEPTH, mode=Mode.SUBTRACT)


solid = part.part
